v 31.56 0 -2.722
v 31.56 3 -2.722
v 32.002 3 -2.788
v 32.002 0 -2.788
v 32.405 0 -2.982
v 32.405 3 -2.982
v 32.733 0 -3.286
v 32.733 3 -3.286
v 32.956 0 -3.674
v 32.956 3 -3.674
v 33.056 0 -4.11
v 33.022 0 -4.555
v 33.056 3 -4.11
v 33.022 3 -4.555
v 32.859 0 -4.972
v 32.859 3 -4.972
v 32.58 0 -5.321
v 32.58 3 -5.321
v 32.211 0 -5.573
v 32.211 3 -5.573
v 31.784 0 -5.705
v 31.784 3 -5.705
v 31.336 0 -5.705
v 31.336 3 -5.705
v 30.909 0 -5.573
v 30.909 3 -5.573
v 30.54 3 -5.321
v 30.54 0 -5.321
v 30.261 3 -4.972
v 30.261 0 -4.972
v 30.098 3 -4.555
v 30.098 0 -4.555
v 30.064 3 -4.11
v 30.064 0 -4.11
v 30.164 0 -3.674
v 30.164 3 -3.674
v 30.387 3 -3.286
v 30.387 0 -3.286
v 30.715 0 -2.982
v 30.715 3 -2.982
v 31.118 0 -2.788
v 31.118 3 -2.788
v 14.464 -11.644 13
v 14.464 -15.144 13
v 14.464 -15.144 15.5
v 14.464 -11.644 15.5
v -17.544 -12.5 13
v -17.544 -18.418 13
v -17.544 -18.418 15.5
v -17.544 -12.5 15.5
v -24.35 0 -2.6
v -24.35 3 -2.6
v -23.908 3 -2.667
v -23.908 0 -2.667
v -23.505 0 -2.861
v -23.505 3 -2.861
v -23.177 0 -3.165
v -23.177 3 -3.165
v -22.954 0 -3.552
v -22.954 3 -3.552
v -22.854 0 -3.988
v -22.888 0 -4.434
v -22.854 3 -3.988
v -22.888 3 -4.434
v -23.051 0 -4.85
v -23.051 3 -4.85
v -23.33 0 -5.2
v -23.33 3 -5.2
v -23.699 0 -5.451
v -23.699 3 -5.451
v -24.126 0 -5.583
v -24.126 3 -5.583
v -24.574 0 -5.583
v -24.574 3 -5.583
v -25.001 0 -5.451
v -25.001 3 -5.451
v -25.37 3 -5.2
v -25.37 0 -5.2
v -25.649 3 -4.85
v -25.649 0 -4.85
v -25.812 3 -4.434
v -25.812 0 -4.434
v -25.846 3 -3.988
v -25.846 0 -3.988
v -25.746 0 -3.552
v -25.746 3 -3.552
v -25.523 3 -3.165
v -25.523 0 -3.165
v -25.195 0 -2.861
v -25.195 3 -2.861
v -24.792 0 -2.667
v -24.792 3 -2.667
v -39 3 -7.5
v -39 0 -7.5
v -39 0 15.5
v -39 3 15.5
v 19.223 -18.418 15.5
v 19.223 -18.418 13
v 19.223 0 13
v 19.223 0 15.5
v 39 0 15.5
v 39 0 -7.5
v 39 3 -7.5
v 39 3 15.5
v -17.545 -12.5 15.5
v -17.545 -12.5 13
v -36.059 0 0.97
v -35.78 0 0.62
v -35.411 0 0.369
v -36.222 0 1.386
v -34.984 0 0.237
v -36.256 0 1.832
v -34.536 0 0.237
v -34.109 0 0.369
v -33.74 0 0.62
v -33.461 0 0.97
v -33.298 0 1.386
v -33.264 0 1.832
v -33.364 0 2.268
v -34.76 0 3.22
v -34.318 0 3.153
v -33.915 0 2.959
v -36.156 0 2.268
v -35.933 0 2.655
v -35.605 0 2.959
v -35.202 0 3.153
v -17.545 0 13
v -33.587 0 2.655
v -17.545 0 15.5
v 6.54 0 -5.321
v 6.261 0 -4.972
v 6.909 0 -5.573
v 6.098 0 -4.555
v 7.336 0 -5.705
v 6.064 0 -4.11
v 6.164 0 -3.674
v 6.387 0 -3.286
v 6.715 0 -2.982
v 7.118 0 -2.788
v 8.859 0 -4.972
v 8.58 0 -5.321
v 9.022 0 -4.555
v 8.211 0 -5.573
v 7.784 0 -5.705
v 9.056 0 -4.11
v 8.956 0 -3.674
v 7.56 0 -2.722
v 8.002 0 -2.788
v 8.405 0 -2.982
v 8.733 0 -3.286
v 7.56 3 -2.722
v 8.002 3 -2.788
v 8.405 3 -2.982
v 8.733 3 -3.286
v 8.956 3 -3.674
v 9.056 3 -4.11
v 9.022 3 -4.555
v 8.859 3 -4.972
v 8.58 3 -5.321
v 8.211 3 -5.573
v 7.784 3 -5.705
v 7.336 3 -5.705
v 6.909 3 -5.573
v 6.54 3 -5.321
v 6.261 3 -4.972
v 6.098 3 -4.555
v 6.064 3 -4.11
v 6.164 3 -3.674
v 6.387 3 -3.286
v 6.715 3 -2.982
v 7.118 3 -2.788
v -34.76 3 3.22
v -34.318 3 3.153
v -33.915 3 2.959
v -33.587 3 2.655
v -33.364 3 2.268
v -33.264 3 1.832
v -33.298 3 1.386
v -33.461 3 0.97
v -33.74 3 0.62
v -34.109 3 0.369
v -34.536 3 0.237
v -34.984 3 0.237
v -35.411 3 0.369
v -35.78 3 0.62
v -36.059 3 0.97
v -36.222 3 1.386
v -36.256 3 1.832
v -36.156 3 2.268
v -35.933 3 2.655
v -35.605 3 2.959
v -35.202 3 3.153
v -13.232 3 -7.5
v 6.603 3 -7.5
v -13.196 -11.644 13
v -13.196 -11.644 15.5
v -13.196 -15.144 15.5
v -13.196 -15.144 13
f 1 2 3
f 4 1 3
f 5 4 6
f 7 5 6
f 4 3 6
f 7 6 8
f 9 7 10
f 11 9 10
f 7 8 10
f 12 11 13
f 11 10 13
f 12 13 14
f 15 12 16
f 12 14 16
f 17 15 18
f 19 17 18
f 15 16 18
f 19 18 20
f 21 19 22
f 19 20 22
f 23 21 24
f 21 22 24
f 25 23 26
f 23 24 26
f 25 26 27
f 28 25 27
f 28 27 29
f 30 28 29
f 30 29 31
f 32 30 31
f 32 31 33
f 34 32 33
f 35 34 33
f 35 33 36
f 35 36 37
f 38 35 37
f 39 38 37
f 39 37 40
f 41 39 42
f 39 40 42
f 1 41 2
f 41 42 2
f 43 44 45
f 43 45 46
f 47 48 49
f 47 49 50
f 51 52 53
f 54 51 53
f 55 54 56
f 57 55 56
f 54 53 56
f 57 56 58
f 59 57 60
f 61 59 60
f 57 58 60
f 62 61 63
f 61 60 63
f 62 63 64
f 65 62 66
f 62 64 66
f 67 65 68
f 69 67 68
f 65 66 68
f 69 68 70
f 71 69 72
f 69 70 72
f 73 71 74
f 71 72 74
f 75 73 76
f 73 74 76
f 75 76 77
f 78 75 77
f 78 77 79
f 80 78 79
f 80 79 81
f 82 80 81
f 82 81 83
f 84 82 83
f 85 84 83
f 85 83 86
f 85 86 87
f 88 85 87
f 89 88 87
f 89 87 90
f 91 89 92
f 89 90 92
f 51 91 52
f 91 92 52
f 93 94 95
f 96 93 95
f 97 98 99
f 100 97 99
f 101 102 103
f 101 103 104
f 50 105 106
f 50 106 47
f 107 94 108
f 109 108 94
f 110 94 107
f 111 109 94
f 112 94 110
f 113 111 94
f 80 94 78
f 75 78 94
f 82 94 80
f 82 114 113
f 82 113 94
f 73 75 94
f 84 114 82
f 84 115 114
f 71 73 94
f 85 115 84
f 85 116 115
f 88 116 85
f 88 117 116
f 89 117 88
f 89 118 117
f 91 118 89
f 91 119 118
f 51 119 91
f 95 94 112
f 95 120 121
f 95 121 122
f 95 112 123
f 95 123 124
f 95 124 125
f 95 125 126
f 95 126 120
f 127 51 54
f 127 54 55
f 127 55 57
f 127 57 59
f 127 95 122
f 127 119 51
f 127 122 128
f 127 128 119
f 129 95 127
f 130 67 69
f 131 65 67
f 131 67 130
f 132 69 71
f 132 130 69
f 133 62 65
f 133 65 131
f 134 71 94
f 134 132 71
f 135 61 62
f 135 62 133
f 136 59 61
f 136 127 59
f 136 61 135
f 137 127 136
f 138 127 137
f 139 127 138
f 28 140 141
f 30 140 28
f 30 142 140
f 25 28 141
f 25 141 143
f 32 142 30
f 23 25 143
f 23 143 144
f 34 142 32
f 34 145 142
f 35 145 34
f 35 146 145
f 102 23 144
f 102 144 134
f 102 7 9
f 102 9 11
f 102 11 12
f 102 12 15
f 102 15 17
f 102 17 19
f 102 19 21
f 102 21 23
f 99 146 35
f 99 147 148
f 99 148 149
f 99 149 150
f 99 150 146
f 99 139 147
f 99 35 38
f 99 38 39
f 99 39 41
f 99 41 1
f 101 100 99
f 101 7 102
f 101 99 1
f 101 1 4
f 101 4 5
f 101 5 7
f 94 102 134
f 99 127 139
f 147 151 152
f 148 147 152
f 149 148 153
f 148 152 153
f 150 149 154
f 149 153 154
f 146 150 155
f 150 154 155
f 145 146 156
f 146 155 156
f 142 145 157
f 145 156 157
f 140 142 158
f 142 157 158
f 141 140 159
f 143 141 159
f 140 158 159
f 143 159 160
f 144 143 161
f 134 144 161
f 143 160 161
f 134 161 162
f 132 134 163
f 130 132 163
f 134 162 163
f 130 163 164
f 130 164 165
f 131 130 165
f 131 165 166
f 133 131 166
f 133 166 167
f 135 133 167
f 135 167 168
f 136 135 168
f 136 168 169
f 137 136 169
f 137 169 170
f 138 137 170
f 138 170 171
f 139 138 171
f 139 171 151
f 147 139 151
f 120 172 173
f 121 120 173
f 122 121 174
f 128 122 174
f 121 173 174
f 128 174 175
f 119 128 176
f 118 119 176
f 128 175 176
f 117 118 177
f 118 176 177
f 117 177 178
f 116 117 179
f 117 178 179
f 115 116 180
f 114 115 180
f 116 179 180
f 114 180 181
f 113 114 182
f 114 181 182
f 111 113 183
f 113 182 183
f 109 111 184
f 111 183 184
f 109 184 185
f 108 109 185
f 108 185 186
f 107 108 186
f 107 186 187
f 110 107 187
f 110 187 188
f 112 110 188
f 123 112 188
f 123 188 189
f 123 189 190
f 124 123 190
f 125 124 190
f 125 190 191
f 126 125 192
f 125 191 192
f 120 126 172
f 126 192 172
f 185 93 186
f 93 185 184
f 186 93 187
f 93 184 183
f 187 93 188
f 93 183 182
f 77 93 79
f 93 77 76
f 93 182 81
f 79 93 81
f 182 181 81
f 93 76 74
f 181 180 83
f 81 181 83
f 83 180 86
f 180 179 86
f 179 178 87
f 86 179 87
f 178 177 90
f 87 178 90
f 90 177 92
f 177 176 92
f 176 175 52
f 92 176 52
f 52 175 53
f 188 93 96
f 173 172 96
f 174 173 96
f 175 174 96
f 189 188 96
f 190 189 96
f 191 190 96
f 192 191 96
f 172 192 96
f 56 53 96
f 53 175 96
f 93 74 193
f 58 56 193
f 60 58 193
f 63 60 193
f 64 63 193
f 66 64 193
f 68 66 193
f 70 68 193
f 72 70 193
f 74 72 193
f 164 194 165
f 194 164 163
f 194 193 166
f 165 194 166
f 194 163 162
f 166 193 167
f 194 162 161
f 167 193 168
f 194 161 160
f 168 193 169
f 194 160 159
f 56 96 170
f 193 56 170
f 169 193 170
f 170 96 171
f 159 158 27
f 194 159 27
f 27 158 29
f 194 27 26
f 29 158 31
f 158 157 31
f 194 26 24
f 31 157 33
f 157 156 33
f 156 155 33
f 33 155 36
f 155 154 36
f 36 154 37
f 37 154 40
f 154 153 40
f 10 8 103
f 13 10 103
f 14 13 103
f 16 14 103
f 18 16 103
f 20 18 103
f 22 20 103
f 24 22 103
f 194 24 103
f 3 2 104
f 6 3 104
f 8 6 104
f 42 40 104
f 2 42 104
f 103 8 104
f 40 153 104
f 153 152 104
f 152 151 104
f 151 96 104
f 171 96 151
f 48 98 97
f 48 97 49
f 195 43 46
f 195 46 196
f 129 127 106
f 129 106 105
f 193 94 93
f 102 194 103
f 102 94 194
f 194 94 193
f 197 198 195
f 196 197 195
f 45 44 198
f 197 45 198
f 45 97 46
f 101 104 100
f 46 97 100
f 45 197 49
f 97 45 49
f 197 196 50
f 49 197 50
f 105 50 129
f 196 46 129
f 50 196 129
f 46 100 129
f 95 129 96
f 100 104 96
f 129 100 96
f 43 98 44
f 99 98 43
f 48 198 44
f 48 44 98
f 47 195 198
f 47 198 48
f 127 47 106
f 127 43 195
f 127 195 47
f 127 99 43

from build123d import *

# Parameters (mm, degrees)
SKETCH_1_W                = 78
SKETCH_1_H                = 15
EXTRUDE_1_DEPTH           = 3
SKETCH_3_R                = 1.5
CUT_EXTRUDE_1_DEPTH       = 3
SKETCH_4_R                = 6
EXTRUDE_2_DEPTH           = 18
SKETCH_5_R                = 4.5
CUT_EXTRUDE_2_DEPTH       = 21
F_2_0MM_2_D               = 3
F_2_0MM_2_DEPTH           = 4.5
F_2_0MM_2_TIP             = 1.5
F_2_0MM_2_ON_FACE_2_D     = 3
F_2_0MM_2_ON_FACE_2_DEPTH = 4.5
F_2_0MM_2_ON_FACE_2_TIP   = 1.5
SKETCH_10_W               = 6
SKETCH_10_H               = 10
CUT_EXTRUDE_3_DEPTH       = 7
SKETCH_13_W               = 19.835687411
SKETCH_13_H               = 21.610205193
CUT_EXTRUDE_4_DEPTH       = 20
SKETCH_14_W               = 11.523038103
SKETCH_14_H               = 10.49031299
EXTRUDE_3_DEPTH           = 3
SKETCH_18_W               = 78
SKETCH_18_H               = 8
EXTRUDE_4_DEPTH           = 3
SKETCH_19_W               = 36.767904102
SKETCH_19_H               = 2.5
EXTRUDE_5_DEPTH           = 12.5
SKETCH_23_R               = 1.65
CUT_EXTRUDE_6_DEPTH       = 12.5
SKETCH_25_W               = 4.236607592
SKETCH_25_H               = 5.36409187
EXTRUDE_7_DEPTH           = 2.5
SKETCH_26_R               = 1.6
CUT_EXTRUDE_7_DEPTH       = 2.5
SKETCH_27_W               = 21.346012392
SKETCH_27_H               = 6.594354882
EXTRUDE_8_DEPTH           = 2.5
SKETCH_28_W               = 36.767231154
SKETCH_28_H               = 5.91819544
EXTRUDE_9_DEPTH           = 2.5
SKETCH_29_W               = 27.660340415
SKETCH_29_H               = 3.5
CUT_EXTRUDE_9_DEPTH       = 2.5


with BuildPart() as part:
    # 草图1 → 凸台-拉伸1 (new body)
    with BuildSketch(Plane(origin=(0, 0, 0), x_dir=(1, 0, 0), z_dir=(0, 1, 0))):
        Rectangle(SKETCH_1_W, SKETCH_1_H)
    extrude(amount=EXTRUDE_1_DEPTH)

    # 草图3 → 切除-拉伸1 (cut)
    with BuildSketch(Plane(origin=(0, 3, 0), x_dir=(1, 0, 0), z_dir=(0, 1, 0))):
        with Locations(Location((-34.76, -1.72, 0), (0, 0, 270))):
            Circle(SKETCH_3_R)
        with Locations(Location((-24.35, 4.1, 0), (0, 0, 270))):
            Circle(SKETCH_3_R)
        with Locations(Location((31.56, 4.221692081, 0), (0, 0, 270))):
            Circle(SKETCH_3_R)
        with Locations(Location((7.56, 4.221692081, 0), (0, 0, 270))):
            Circle(SKETCH_3_R)
    extrude(amount=-CUT_EXTRUDE_1_DEPTH, mode=Mode.SUBTRACT)

    # 草图4 → 凸台-拉伸2 (add)
    with BuildSketch(Plane(origin=(0, 3, 0), x_dir=(1, 0, 0), z_dir=(0, 1, 0))):
        with Locations(Location((-3, -1.234165229, 0), (0, 0, 270))):
            Circle(SKETCH_4_R)
    extrude(amount=EXTRUDE_2_DEPTH)

    # 草图5 → 切除-拉伸2 (cut)
    with BuildSketch(Plane(origin=(0, 21, 0), x_dir=(1, 0, 0), z_dir=(0, 1, 0))):
        with Locations(Location((-3, -1.234165229, 0), (0, 0, 270))):
            Circle(SKETCH_5_R)
    extrude(amount=-CUT_EXTRUDE_2_DEPTH, mode=Mode.SUBTRACT)

    # Ø2.0mm 暗销孔2
    with Locations(Plane(origin=(-7.901331048, 17.342107422, 4.694938836), x_dir=(-0.576795601176, 0, -0.816888507977), z_dir=(-0.816888507977, 0, 0.576795601176))):
        with Locations((0, 0)):
            Hole(F_2_0MM_2_D / 2, depth=F_2_0MM_2_DEPTH)
            with Locations((0, 0, -(F_2_0MM_2_DEPTH + F_2_0MM_2_TIP / 2))):  # 90° drill point
                Cone(0, F_2_0MM_2_D / 2, F_2_0MM_2_TIP, mode=Mode.SUBTRACT)

    # Ø2.0mm 暗销孔2 on face 2
    with Locations(Plane(origin=(1.071764877, 17.164817099, 5.641061052), x_dir=(0.734483043181, 0, -0.678627039897), z_dir=(0.678627039897, 0, 0.734483043181))):
        with Locations((0, 0)):
            Hole(F_2_0MM_2_ON_FACE_2_D / 2, depth=F_2_0MM_2_ON_FACE_2_DEPTH)
            with Locations((0, 0, -(F_2_0MM_2_ON_FACE_2_DEPTH + F_2_0MM_2_ON_FACE_2_TIP / 2))):  # 90° drill point
                Cone(0, F_2_0MM_2_ON_FACE_2_D / 2, F_2_0MM_2_ON_FACE_2_TIP, mode=Mode.SUBTRACT)

    # 草图10 → 切除-拉伸3 (cut)
    with BuildSketch(Plane(origin=(0, 0, -7.5), x_dir=(-1, 0, 0), z_dir=(0, 0, -1))):
        with Locations((3, 8)):
            Rectangle(SKETCH_10_W, SKETCH_10_H)
    extrude(amount=-CUT_EXTRUDE_3_DEPTH, mode=Mode.SUBTRACT)

    # 草图13 → 切除-拉伸4 (cut)
    with BuildSketch(Plane(origin=(0, 0, -7.5), x_dir=(-1, 0, 0), z_dir=(0, 0, -1))):
        with Locations((3.314421038, 13.805102597)):
            Rectangle(SKETCH_13_W, SKETCH_13_H)
    extrude(amount=-CUT_EXTRUDE_4_DEPTH, mode=Mode.SUBTRACT)

    # 草图14 → 凸台-拉伸3 (add)
    with BuildSketch(Plane(origin=(0, 3, 0), x_dir=(1, 0, 0), z_dir=(0, 1, 0))):
        with Locations((-2.989467433, -1.263493391)):
            Rectangle(SKETCH_14_W, SKETCH_14_H)
    extrude(amount=-EXTRUDE_3_DEPTH)

    # 草图18 → 凸台-拉伸4 (add)
    with BuildSketch(Plane.XZ):
        with Locations((0, 11.5)):
            Rectangle(SKETCH_18_W, SKETCH_18_H)
    extrude(amount=-EXTRUDE_4_DEPTH)

    # 草图19 → 凸台-拉伸5 (add)
    with BuildSketch(Plane.XZ):
        with Locations((0.839237194, 14.25)):
            Rectangle(SKETCH_19_W, SKETCH_19_H)
    extrude(amount=EXTRUDE_5_DEPTH)

    # 草图23 → 切除-拉伸6 (cut)
    with BuildSketch(Plane(origin=(0, 0, 13), x_dir=(-1, 0, 0), z_dir=(0, 0, -1))):
        with Locations((-8.603189245, -6.05592298)):
            Circle(SKETCH_23_R)
        with Locations((2.596810755, -6.05592298)):
            Circle(SKETCH_23_R)
    extrude(amount=-CUT_EXTRUDE_6_DEPTH, mode=Mode.SUBTRACT)

    # 草图25 → 凸台-拉伸7 (add)
    with BuildSketch(Plane(origin=(0, 0, 13), x_dir=(-1, 0, 0), z_dir=(0, 0, -1))):
        with Locations((2.330668631, -6.426480946)):
            Rectangle(SKETCH_25_W, SKETCH_25_H)
    extrude(amount=-EXTRUDE_7_DEPTH)

    # 草图26 → 切除-拉伸7 (cut)
    with BuildSketch(Plane(origin=(0, 0, 13), x_dir=(-1, 0, 0), z_dir=(0, 0, -1))):
        with Locations((4.196810755, -6.05592298)):
            Circle(SKETCH_26_R)
    extrude(amount=-CUT_EXTRUDE_7_DEPTH, mode=Mode.SUBTRACT)

    # 草图27 → 凸台-拉伸8 (add)
    with BuildSketch(Plane(origin=(0, 0, 13), x_dir=(-1, 0, 0), z_dir=(0, 0, -1))):
        with Locations((-2.379316694, -6.691741876)):
            Rectangle(SKETCH_27_W, SKETCH_27_H)
    extrude(amount=-EXTRUDE_8_DEPTH)

    # 草图28 → 凸台-拉伸9 (add)
    with BuildSketch(Plane(origin=(0, 0, 13), x_dir=(-1, 0, 0), z_dir=(0, 0, -1))):
        with Locations((-0.839573668, -15.45909772)):
            Rectangle(SKETCH_28_W, SKETCH_28_H)
    extrude(amount=-EXTRUDE_9_DEPTH)

    # 草图29 → 切除-拉伸9 (cut)
    with BuildSketch(Plane(origin=(0, 0, 13), x_dir=(-1, 0, 0), z_dir=(0, 0, -1))):
        with Locations((-0.633763758, -13.394190827)):
            Rectangle(SKETCH_29_W, SKETCH_29_H)
    extrude(amount=-CUT_EXTRUDE_9_DEPTH, mode=Mode.SUBTRACT)


solid = part.part
